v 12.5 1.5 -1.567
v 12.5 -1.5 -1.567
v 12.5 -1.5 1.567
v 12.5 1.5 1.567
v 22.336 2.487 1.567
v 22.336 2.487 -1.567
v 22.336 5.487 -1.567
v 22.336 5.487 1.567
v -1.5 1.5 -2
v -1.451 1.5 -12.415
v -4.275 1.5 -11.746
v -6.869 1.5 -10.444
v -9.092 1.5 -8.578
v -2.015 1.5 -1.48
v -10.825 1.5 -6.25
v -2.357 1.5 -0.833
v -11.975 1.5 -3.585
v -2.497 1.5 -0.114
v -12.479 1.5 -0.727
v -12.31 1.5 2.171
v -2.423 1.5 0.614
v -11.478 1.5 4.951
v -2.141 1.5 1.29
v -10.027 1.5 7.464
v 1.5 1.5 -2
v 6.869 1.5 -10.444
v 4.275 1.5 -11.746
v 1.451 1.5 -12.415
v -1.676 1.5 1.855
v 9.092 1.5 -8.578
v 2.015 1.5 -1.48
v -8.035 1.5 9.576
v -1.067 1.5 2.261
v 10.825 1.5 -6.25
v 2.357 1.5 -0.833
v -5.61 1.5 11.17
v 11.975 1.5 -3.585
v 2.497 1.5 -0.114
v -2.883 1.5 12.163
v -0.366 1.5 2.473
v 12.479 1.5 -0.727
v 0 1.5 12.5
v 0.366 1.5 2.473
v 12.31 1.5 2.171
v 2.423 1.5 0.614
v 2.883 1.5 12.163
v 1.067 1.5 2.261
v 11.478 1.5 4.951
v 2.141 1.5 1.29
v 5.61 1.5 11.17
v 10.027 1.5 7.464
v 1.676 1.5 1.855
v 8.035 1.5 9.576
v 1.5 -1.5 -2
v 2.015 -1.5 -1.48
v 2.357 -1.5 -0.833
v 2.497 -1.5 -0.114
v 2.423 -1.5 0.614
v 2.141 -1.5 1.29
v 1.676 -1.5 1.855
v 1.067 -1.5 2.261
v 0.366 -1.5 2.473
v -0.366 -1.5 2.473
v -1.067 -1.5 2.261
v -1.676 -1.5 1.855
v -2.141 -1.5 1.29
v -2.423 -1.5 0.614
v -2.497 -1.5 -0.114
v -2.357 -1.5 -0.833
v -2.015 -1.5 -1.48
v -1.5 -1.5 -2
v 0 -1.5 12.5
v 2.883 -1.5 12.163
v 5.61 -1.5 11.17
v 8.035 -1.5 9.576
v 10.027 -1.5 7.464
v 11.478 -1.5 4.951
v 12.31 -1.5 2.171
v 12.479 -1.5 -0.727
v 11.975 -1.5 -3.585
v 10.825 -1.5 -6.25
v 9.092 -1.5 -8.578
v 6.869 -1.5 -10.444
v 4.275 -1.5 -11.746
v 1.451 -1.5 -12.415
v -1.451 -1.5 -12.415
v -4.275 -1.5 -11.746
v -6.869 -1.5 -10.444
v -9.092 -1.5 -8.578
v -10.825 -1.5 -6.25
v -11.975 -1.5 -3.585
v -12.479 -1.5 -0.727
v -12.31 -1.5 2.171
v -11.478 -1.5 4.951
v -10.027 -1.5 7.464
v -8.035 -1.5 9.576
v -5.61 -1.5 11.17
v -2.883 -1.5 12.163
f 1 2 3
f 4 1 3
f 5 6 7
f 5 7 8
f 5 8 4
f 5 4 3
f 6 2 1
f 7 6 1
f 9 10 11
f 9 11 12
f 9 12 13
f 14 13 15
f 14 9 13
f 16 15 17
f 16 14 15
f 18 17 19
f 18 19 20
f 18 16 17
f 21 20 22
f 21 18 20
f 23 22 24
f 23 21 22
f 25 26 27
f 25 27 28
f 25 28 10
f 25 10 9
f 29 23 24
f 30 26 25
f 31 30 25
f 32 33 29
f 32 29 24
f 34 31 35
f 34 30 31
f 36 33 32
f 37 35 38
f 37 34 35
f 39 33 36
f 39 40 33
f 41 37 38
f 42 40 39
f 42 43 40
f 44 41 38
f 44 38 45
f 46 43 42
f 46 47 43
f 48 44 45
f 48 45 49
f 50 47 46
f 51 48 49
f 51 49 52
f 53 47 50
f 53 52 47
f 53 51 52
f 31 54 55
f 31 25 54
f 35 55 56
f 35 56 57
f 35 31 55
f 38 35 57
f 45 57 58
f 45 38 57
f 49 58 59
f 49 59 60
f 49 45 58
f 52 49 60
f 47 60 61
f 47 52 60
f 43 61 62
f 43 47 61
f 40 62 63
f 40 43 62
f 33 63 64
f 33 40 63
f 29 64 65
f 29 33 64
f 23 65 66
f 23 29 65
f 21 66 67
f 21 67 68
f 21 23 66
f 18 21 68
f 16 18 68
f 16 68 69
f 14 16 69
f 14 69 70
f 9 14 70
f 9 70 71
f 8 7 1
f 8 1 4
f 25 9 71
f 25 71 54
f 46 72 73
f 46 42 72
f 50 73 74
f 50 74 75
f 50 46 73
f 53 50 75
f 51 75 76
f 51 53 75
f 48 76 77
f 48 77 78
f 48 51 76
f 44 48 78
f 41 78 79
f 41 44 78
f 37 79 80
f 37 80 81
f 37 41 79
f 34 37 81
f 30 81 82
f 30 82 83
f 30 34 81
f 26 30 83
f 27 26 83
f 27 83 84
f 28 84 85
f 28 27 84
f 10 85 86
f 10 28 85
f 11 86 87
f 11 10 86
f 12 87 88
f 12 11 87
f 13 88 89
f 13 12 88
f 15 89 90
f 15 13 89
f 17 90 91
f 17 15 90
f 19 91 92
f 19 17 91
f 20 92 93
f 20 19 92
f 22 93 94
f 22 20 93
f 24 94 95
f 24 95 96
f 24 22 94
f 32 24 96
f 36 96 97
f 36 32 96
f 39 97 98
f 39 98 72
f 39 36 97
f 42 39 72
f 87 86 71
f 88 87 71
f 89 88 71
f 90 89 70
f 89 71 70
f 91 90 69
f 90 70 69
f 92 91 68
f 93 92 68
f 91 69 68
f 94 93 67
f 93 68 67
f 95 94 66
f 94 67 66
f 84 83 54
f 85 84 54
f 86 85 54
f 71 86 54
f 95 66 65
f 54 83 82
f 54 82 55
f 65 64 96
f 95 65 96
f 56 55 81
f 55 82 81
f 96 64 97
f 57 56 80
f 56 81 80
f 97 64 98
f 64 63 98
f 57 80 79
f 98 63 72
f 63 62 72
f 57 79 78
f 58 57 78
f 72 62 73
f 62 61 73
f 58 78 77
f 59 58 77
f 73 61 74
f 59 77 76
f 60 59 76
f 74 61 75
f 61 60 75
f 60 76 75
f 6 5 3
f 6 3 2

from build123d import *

# Parameters (mm, degrees)
SKETCH1_R           = 12.5
BOSS_EXTRUDE1_DEPTH = 1.5
SKETCH3_W           = 3.134627122
SKETCH3_H           = 3


with BuildPart() as part:
    # Sketch1 → Boss-Extrude1 (new, symmetric)
    with BuildSketch(Plane(origin=(0, 0, 0), x_dir=(1, 0, 0), z_dir=(0, 1, 0))):
        with Locations(Location((0, 0, 0), (0, 0, 270))):
            Circle(SKETCH1_R)
        with BuildLine():
            Line((-1.5, 2), (1.5, 2))
            ThreePointArc((1.5, 2), (0, -2.5), (-1.5, 2))
        make_face(mode=Mode.SUBTRACT)
    extrude(amount=BOSS_EXTRUDE1_DEPTH, both=True)


with BuildPart() as body_2:
    # Sweep2: sweep along a path in Sketch2
    with BuildLine(Plane.XY) as sweep2_path:
        Line((12.5, 0), (22.336176394, 3.986535257))
    # Sketch3 → Sweep2 (sweep)
    with BuildSketch(Plane(origin=(12.5, 0, 0), x_dir=(0, 0, -1), z_dir=(1, 0, 0))):
        Rectangle(SKETCH3_W, SKETCH3_H)
    sweep(path=sweep2_path.line)


solid = Compound([part.part, body_2.part])
